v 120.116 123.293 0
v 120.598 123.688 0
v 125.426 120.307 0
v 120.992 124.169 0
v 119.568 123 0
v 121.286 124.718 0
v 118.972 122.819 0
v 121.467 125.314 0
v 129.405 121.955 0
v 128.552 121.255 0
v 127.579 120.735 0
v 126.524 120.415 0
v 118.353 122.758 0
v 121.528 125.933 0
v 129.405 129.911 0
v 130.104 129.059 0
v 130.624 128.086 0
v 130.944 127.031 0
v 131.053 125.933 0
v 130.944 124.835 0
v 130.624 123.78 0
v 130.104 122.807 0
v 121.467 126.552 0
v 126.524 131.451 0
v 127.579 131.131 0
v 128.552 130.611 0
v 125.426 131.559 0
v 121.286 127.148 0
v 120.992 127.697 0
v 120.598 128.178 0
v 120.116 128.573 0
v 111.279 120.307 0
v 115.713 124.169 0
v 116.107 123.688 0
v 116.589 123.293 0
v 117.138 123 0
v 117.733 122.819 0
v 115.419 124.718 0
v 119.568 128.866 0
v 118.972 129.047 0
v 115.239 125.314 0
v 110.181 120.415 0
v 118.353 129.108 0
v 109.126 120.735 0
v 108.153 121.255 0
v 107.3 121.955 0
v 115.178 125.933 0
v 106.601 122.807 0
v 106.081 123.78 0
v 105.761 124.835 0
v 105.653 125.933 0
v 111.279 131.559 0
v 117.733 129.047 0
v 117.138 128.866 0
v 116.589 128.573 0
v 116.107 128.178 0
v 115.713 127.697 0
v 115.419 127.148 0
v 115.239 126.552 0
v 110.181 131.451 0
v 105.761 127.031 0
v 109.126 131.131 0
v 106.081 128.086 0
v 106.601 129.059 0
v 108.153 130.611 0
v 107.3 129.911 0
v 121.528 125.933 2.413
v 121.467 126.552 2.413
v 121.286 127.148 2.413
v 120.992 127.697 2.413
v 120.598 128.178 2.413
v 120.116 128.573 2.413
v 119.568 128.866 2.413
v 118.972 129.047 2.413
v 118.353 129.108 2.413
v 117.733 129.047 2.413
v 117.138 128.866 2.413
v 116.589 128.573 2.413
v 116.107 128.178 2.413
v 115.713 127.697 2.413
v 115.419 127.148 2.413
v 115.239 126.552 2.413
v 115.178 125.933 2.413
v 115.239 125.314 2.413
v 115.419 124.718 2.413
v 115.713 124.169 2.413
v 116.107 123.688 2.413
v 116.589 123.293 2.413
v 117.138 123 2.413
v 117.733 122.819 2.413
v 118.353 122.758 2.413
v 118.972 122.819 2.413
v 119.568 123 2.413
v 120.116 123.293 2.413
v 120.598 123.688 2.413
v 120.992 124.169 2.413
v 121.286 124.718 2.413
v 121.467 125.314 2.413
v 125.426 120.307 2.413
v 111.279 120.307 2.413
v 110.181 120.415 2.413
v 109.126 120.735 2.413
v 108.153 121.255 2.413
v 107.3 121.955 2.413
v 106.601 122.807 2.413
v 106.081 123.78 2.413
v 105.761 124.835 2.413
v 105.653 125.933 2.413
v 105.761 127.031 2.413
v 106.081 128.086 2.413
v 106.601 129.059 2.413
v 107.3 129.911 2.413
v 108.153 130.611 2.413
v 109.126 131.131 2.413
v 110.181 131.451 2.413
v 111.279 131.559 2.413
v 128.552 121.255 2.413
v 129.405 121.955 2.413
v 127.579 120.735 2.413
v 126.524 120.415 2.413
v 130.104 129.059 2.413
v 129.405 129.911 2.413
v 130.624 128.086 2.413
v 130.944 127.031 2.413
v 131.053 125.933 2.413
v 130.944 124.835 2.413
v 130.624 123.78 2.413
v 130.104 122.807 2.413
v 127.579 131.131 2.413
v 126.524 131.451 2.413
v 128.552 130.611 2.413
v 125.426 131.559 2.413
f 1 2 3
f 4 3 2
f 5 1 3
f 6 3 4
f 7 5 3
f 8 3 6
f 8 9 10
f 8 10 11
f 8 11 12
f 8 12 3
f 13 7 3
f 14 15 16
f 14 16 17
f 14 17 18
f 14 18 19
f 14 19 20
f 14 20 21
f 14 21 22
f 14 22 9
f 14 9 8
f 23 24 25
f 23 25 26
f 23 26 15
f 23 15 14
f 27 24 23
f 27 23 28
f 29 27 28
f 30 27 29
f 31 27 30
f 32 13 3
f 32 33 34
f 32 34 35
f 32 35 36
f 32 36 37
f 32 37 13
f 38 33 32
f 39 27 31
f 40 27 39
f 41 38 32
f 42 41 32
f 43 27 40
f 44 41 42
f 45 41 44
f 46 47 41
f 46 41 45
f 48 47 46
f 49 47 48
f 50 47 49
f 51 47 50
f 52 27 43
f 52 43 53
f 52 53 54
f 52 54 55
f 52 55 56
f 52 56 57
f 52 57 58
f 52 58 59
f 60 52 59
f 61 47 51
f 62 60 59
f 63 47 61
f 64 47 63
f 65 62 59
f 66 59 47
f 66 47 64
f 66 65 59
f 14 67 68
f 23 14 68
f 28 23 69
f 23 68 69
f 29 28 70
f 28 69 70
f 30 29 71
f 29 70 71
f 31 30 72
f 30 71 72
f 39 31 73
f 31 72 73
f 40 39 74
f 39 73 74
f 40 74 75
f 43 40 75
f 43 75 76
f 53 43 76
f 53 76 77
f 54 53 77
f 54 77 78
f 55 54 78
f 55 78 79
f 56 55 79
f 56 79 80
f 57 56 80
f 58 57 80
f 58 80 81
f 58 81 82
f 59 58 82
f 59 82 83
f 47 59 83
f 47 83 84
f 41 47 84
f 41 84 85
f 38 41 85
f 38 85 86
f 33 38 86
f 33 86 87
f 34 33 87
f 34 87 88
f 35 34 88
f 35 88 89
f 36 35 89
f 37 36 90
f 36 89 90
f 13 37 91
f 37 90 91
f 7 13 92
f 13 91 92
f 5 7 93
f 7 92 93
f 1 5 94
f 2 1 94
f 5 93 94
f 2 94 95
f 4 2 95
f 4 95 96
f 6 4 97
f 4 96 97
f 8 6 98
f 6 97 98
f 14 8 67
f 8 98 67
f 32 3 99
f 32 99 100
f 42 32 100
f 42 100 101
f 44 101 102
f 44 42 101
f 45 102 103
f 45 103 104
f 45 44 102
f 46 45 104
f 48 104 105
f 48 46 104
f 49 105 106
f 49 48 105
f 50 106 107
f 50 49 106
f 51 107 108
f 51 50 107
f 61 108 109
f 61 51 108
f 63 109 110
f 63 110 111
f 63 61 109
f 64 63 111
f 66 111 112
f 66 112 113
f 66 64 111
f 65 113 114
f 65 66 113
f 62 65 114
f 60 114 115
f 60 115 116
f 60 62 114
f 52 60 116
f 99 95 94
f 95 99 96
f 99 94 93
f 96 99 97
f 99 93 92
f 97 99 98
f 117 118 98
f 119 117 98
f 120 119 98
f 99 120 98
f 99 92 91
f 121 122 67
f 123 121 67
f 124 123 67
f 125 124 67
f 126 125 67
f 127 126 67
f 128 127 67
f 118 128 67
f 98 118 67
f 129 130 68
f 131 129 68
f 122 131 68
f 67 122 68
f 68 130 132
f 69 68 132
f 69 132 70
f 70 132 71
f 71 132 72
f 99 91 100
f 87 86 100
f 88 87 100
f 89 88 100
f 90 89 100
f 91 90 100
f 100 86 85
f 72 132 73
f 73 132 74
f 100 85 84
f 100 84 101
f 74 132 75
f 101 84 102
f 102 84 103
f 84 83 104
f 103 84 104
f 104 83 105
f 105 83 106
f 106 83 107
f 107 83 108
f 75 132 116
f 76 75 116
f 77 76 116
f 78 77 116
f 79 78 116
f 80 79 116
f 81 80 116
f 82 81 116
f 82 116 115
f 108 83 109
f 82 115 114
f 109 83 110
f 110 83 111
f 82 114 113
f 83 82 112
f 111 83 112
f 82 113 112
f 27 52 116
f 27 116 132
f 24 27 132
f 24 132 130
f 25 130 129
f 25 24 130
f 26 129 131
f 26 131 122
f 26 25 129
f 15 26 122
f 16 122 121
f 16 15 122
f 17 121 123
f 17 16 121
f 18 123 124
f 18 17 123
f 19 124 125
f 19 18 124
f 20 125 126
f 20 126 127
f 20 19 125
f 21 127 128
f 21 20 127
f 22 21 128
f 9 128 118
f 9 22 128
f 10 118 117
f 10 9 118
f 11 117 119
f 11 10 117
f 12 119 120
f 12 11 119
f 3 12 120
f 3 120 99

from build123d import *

# Parameters (mm, degrees)
EXTRUDE1_DEPTH     = 2.413
CUT_EXTRUDE1_REACH = 4.413
SKETCH4_R          = 3.175


with BuildPart() as part:
    # Sketch1 → Extrude1 (new body)
    with BuildSketch(Plane.XY):
        with BuildLine():
            Line((111.27866266, 131.559165896), (125.42646266, 131.559165896))
            ThreePointArc((125.42646266, 131.559165896), (131.05256266, 125.933065896), (125.42646266, 120.306965896))
            Line((125.42646266, 120.306965896), (111.27866266, 120.306965896))
            ThreePointArc((111.27866266, 120.306965896), (105.65256266, 125.933065896), (111.27866266, 131.559165896))
        make_face()
    extrude(amount=EXTRUDE1_DEPTH)

    # Sketch4 → Cut-Extrude1 (cut, up to next)
    with BuildSketch(Plane.XY.offset(2.413), mode=Mode.PRIVATE) as cut_extrude1_sk1:
        with Locations((118.35256266, 125.933065896)):
            Circle(SKETCH4_R)
    cut_extrude1_tool1 = extrude(cut_extrude1_sk1.sketch, amount=-CUT_EXTRUDE1_REACH, mode=Mode.PRIVATE) & part.part
    add(cut_extrude1_tool1.solids().sort_by_distance((118.352563, 125.933066, 2.413))[0], mode=Mode.SUBTRACT)


solid = part.part
